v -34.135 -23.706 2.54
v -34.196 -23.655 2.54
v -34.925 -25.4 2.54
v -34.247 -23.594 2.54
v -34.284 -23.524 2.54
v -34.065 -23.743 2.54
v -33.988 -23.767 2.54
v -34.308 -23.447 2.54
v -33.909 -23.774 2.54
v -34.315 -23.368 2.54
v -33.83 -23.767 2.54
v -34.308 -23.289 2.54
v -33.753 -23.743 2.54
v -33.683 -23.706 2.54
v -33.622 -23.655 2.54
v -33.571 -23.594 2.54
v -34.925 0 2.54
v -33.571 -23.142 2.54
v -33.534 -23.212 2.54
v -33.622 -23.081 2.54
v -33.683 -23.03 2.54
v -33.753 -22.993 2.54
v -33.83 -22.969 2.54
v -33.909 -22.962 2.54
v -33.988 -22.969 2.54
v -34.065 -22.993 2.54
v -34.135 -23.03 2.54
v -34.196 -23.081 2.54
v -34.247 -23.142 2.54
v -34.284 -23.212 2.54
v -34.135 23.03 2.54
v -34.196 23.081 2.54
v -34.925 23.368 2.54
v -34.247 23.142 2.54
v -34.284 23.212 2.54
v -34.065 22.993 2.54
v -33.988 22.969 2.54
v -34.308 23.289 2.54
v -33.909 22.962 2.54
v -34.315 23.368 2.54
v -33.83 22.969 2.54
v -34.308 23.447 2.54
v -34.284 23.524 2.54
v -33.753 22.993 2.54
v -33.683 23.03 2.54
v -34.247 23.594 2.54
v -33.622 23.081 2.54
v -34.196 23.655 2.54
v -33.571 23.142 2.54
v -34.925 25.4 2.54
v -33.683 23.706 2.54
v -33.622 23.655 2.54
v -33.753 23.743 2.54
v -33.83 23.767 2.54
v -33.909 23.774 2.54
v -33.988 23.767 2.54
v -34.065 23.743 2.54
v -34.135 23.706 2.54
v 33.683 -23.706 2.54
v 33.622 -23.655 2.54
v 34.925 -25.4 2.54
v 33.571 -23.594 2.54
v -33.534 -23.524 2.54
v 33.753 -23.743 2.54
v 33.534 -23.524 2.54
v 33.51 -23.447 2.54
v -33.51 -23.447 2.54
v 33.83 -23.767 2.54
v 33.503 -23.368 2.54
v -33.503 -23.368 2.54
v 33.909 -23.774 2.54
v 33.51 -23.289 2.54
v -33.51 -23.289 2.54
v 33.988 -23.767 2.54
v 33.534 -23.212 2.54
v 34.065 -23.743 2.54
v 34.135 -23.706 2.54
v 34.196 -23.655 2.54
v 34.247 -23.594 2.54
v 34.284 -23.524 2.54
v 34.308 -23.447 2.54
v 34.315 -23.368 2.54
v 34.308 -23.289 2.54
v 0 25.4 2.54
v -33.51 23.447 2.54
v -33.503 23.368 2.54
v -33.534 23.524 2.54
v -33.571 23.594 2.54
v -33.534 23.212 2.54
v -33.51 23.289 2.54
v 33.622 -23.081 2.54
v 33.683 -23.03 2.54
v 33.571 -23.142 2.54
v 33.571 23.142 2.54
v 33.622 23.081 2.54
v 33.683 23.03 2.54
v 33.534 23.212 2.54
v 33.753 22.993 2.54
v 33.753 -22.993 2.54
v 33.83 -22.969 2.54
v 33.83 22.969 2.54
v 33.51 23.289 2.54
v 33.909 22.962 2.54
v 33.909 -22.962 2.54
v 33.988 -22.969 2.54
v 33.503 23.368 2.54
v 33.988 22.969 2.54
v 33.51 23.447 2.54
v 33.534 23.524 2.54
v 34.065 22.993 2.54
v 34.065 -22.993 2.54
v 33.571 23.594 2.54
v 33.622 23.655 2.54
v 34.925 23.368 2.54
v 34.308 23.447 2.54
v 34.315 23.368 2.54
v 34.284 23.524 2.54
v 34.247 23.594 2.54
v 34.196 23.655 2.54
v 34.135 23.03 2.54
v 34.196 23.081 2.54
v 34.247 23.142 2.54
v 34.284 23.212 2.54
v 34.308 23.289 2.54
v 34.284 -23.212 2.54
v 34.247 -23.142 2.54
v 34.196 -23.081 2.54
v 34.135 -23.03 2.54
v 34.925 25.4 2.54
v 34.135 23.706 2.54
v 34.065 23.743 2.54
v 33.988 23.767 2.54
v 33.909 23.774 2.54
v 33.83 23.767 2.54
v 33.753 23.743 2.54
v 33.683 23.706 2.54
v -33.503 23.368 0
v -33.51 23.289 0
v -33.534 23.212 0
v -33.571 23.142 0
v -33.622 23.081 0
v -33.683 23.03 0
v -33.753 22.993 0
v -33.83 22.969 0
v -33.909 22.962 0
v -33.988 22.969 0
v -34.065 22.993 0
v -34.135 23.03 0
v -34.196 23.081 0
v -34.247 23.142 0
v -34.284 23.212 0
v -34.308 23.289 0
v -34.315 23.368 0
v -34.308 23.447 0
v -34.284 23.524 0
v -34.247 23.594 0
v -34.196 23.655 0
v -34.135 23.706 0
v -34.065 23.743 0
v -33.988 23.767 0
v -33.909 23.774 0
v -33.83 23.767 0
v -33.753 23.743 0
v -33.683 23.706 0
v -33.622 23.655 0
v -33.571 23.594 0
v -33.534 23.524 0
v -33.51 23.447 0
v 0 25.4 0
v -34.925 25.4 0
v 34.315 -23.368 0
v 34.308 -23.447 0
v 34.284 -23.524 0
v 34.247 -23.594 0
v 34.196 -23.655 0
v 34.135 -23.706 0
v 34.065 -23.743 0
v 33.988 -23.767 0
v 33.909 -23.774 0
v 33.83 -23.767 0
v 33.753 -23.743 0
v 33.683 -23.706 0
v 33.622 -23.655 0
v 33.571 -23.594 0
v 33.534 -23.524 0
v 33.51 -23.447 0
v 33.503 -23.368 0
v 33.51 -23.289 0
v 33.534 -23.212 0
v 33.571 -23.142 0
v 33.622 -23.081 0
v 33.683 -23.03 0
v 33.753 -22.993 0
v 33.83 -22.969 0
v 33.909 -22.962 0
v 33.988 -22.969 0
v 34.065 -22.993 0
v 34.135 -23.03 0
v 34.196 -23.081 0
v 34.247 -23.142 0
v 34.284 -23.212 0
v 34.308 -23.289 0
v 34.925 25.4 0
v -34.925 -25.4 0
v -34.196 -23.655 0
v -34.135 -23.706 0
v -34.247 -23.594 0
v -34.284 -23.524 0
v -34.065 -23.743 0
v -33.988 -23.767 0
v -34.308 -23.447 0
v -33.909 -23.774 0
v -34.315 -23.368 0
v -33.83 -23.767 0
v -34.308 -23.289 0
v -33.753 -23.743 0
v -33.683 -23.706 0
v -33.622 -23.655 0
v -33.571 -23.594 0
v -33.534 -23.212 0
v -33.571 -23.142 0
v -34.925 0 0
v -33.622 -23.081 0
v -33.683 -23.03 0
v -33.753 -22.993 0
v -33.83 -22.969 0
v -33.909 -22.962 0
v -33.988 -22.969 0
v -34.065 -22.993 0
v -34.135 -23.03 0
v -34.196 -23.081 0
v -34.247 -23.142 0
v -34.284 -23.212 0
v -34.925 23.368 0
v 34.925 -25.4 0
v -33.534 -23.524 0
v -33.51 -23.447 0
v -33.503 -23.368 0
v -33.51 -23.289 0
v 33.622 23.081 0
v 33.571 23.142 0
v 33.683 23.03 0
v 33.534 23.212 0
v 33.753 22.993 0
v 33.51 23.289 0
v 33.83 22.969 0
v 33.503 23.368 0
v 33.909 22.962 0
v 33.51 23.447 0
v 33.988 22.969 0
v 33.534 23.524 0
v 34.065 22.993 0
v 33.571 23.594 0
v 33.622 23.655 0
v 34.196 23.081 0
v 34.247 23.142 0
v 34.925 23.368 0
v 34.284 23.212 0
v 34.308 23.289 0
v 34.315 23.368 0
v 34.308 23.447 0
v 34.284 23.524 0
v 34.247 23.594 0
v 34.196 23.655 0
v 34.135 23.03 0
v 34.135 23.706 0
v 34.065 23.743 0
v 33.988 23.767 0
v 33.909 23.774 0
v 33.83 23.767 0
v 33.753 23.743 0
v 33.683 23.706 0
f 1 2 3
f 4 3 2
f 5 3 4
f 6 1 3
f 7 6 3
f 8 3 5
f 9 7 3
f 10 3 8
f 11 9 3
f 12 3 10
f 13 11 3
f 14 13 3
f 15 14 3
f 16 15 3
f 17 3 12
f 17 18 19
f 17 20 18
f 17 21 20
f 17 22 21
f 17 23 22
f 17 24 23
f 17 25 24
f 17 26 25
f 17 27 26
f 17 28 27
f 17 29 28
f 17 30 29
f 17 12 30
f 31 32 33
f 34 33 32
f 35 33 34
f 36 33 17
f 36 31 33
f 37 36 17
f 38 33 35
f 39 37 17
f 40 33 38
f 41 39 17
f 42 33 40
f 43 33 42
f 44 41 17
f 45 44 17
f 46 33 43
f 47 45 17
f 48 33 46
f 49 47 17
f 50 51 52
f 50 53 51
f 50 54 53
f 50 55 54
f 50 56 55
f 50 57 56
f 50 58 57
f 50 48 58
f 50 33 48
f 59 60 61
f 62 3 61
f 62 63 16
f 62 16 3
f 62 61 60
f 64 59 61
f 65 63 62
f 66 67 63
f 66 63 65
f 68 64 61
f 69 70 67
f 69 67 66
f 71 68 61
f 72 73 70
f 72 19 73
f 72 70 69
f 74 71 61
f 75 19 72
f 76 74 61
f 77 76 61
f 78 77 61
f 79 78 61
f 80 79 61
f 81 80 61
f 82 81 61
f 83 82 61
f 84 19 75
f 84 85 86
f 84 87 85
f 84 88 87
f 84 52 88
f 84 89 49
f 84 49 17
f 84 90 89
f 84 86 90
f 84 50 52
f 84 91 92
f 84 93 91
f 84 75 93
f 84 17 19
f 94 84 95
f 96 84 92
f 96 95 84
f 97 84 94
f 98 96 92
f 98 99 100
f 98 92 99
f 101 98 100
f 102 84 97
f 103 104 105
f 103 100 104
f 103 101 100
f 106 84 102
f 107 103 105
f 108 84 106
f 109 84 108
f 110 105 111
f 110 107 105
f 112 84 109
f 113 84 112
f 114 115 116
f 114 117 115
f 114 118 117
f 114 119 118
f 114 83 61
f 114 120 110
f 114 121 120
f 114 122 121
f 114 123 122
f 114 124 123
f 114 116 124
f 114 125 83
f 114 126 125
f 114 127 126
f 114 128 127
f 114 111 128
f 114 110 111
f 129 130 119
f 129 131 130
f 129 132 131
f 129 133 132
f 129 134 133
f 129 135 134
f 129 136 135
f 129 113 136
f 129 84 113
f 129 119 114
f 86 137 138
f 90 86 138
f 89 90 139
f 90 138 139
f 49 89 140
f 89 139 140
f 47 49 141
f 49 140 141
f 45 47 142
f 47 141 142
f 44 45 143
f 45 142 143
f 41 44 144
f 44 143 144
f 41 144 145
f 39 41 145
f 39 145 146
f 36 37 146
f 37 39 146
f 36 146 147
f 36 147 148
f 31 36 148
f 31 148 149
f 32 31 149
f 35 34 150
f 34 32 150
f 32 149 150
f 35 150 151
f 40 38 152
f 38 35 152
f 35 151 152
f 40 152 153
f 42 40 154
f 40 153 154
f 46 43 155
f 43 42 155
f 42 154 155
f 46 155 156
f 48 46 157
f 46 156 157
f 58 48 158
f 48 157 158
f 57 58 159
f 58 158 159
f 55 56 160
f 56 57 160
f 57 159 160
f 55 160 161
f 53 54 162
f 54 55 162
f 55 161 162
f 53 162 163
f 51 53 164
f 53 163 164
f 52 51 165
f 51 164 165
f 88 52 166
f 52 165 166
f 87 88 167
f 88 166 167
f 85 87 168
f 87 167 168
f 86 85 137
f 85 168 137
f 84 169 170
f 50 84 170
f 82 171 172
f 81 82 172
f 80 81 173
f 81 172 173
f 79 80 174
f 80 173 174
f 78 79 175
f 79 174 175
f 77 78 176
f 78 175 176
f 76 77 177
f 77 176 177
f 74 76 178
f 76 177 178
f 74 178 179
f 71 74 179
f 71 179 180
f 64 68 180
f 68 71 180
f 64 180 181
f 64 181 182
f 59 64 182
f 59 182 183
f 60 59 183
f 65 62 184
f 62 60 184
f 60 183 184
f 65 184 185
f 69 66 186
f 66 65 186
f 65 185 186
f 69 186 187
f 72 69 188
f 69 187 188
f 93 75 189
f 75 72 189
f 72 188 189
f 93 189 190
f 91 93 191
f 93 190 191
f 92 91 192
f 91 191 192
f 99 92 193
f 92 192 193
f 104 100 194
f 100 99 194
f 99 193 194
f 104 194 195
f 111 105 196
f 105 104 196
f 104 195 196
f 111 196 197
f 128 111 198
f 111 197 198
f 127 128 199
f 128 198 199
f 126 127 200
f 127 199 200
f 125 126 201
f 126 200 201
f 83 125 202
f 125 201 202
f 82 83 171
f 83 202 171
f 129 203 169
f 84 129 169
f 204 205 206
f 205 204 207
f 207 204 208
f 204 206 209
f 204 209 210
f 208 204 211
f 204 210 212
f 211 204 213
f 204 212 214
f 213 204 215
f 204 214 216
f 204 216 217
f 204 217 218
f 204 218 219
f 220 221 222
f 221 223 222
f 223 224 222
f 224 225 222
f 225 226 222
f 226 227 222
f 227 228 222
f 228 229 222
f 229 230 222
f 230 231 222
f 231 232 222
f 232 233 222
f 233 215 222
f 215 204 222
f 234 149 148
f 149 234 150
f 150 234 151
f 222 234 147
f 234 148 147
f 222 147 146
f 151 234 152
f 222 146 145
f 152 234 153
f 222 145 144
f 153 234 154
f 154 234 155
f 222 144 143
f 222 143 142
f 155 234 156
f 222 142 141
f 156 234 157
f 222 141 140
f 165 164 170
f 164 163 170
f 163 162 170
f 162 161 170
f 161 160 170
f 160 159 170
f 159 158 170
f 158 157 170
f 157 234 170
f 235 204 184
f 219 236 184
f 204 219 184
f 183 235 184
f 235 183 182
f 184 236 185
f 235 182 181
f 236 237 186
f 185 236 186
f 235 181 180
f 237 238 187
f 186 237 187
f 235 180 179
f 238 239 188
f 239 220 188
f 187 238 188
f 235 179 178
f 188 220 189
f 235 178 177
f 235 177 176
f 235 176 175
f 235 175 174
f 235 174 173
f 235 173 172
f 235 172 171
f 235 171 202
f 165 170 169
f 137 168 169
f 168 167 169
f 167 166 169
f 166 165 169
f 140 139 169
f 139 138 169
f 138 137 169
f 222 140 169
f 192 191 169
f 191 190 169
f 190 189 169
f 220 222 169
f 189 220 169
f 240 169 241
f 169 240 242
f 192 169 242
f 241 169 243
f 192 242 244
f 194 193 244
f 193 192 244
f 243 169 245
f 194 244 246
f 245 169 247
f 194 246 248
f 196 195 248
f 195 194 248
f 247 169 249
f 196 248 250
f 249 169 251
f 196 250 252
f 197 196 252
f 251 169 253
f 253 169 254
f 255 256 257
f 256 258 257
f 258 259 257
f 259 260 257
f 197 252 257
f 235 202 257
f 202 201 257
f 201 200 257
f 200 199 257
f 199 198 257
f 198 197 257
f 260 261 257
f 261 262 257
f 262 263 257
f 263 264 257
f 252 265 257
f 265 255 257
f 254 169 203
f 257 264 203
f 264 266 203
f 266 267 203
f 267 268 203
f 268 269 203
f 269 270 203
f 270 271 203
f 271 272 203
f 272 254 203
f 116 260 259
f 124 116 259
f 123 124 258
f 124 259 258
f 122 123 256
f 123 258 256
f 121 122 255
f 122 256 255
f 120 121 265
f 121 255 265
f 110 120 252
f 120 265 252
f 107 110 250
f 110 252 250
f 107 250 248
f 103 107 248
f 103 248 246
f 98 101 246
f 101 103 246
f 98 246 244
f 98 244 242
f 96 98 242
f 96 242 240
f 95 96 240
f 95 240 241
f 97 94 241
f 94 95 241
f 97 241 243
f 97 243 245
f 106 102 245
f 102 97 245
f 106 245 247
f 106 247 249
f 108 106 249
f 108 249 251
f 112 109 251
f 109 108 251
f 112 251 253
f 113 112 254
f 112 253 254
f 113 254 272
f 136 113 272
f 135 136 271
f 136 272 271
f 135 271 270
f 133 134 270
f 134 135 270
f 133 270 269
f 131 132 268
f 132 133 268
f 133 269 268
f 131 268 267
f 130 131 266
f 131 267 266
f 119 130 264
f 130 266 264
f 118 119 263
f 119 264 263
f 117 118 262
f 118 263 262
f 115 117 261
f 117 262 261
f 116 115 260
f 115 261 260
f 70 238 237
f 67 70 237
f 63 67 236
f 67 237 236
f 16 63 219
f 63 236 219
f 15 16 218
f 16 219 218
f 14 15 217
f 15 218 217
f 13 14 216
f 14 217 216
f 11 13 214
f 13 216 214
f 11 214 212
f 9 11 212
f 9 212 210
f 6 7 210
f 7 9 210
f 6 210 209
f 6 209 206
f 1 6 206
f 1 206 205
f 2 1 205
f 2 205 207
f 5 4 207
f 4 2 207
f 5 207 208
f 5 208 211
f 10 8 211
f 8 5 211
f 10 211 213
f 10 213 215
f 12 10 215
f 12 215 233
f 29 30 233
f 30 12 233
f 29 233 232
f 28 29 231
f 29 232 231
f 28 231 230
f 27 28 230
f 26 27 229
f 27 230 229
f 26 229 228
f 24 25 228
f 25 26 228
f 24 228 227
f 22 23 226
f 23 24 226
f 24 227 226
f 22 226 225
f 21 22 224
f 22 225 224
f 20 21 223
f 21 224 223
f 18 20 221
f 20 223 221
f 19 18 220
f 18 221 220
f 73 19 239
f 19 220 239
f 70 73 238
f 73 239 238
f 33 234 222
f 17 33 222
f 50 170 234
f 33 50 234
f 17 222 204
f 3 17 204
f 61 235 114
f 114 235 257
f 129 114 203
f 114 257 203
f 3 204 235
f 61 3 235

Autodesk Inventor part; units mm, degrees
ref_plane "YZ Plane" through (0, 0, 0) normal (1, 0, 0) x (0, 1, 0)
ref_plane "XZ Plane" through (0, 0, 0) normal (0, 1, 0) x (-1, 0, 0)
ref_plane "XY Plane" through (0, 0, 0) normal (0, 0, 1) x (1, 0, 0)
sketch "Sketch1" plane through (0, 0, 0) normal (0, 0, 1) x (1, 0, 0)
  line L0 (0, 25.4) -> (-34.925, 25.4)
  line L1 (-34.925, 25.4) -> (-34.925, 0)
  line L2 (-34.925, 0) -> (-34.925, -25.4)
  line L3 (-34.925, -25.4) -> (34.925, -25.4)
  line L4 (34.925, -25.4) -> (34.925, 25.4)
  line L5 (34.925, 25.4) -> (0, 25.4)
  line L6 (34.925, 25.4) -> (34.925, 23.368)
  line L7 (-34.925, 25.4) -> (-34.925, 23.368)
  circle A0 centre (33.909, -23.368) radius 0.4064
  circle A1 centre (33.909, 23.368) radius 0.4064
  circle A2 centre (-33.909, 23.368) radius 0.4064
  circle A3 centre (-33.909, -23.368) radius 0.4064
  point P0 (0, 0)
  dimension "d11" = 0.8128
  dimension "d12" = 0.8128
  dimension "d13" = 0.8128
  dimension "d14" = 0.8128
extrude "Extrusion1" add sketch "Sketch1" along normal blind 2.54
properties part number "espHolder"
